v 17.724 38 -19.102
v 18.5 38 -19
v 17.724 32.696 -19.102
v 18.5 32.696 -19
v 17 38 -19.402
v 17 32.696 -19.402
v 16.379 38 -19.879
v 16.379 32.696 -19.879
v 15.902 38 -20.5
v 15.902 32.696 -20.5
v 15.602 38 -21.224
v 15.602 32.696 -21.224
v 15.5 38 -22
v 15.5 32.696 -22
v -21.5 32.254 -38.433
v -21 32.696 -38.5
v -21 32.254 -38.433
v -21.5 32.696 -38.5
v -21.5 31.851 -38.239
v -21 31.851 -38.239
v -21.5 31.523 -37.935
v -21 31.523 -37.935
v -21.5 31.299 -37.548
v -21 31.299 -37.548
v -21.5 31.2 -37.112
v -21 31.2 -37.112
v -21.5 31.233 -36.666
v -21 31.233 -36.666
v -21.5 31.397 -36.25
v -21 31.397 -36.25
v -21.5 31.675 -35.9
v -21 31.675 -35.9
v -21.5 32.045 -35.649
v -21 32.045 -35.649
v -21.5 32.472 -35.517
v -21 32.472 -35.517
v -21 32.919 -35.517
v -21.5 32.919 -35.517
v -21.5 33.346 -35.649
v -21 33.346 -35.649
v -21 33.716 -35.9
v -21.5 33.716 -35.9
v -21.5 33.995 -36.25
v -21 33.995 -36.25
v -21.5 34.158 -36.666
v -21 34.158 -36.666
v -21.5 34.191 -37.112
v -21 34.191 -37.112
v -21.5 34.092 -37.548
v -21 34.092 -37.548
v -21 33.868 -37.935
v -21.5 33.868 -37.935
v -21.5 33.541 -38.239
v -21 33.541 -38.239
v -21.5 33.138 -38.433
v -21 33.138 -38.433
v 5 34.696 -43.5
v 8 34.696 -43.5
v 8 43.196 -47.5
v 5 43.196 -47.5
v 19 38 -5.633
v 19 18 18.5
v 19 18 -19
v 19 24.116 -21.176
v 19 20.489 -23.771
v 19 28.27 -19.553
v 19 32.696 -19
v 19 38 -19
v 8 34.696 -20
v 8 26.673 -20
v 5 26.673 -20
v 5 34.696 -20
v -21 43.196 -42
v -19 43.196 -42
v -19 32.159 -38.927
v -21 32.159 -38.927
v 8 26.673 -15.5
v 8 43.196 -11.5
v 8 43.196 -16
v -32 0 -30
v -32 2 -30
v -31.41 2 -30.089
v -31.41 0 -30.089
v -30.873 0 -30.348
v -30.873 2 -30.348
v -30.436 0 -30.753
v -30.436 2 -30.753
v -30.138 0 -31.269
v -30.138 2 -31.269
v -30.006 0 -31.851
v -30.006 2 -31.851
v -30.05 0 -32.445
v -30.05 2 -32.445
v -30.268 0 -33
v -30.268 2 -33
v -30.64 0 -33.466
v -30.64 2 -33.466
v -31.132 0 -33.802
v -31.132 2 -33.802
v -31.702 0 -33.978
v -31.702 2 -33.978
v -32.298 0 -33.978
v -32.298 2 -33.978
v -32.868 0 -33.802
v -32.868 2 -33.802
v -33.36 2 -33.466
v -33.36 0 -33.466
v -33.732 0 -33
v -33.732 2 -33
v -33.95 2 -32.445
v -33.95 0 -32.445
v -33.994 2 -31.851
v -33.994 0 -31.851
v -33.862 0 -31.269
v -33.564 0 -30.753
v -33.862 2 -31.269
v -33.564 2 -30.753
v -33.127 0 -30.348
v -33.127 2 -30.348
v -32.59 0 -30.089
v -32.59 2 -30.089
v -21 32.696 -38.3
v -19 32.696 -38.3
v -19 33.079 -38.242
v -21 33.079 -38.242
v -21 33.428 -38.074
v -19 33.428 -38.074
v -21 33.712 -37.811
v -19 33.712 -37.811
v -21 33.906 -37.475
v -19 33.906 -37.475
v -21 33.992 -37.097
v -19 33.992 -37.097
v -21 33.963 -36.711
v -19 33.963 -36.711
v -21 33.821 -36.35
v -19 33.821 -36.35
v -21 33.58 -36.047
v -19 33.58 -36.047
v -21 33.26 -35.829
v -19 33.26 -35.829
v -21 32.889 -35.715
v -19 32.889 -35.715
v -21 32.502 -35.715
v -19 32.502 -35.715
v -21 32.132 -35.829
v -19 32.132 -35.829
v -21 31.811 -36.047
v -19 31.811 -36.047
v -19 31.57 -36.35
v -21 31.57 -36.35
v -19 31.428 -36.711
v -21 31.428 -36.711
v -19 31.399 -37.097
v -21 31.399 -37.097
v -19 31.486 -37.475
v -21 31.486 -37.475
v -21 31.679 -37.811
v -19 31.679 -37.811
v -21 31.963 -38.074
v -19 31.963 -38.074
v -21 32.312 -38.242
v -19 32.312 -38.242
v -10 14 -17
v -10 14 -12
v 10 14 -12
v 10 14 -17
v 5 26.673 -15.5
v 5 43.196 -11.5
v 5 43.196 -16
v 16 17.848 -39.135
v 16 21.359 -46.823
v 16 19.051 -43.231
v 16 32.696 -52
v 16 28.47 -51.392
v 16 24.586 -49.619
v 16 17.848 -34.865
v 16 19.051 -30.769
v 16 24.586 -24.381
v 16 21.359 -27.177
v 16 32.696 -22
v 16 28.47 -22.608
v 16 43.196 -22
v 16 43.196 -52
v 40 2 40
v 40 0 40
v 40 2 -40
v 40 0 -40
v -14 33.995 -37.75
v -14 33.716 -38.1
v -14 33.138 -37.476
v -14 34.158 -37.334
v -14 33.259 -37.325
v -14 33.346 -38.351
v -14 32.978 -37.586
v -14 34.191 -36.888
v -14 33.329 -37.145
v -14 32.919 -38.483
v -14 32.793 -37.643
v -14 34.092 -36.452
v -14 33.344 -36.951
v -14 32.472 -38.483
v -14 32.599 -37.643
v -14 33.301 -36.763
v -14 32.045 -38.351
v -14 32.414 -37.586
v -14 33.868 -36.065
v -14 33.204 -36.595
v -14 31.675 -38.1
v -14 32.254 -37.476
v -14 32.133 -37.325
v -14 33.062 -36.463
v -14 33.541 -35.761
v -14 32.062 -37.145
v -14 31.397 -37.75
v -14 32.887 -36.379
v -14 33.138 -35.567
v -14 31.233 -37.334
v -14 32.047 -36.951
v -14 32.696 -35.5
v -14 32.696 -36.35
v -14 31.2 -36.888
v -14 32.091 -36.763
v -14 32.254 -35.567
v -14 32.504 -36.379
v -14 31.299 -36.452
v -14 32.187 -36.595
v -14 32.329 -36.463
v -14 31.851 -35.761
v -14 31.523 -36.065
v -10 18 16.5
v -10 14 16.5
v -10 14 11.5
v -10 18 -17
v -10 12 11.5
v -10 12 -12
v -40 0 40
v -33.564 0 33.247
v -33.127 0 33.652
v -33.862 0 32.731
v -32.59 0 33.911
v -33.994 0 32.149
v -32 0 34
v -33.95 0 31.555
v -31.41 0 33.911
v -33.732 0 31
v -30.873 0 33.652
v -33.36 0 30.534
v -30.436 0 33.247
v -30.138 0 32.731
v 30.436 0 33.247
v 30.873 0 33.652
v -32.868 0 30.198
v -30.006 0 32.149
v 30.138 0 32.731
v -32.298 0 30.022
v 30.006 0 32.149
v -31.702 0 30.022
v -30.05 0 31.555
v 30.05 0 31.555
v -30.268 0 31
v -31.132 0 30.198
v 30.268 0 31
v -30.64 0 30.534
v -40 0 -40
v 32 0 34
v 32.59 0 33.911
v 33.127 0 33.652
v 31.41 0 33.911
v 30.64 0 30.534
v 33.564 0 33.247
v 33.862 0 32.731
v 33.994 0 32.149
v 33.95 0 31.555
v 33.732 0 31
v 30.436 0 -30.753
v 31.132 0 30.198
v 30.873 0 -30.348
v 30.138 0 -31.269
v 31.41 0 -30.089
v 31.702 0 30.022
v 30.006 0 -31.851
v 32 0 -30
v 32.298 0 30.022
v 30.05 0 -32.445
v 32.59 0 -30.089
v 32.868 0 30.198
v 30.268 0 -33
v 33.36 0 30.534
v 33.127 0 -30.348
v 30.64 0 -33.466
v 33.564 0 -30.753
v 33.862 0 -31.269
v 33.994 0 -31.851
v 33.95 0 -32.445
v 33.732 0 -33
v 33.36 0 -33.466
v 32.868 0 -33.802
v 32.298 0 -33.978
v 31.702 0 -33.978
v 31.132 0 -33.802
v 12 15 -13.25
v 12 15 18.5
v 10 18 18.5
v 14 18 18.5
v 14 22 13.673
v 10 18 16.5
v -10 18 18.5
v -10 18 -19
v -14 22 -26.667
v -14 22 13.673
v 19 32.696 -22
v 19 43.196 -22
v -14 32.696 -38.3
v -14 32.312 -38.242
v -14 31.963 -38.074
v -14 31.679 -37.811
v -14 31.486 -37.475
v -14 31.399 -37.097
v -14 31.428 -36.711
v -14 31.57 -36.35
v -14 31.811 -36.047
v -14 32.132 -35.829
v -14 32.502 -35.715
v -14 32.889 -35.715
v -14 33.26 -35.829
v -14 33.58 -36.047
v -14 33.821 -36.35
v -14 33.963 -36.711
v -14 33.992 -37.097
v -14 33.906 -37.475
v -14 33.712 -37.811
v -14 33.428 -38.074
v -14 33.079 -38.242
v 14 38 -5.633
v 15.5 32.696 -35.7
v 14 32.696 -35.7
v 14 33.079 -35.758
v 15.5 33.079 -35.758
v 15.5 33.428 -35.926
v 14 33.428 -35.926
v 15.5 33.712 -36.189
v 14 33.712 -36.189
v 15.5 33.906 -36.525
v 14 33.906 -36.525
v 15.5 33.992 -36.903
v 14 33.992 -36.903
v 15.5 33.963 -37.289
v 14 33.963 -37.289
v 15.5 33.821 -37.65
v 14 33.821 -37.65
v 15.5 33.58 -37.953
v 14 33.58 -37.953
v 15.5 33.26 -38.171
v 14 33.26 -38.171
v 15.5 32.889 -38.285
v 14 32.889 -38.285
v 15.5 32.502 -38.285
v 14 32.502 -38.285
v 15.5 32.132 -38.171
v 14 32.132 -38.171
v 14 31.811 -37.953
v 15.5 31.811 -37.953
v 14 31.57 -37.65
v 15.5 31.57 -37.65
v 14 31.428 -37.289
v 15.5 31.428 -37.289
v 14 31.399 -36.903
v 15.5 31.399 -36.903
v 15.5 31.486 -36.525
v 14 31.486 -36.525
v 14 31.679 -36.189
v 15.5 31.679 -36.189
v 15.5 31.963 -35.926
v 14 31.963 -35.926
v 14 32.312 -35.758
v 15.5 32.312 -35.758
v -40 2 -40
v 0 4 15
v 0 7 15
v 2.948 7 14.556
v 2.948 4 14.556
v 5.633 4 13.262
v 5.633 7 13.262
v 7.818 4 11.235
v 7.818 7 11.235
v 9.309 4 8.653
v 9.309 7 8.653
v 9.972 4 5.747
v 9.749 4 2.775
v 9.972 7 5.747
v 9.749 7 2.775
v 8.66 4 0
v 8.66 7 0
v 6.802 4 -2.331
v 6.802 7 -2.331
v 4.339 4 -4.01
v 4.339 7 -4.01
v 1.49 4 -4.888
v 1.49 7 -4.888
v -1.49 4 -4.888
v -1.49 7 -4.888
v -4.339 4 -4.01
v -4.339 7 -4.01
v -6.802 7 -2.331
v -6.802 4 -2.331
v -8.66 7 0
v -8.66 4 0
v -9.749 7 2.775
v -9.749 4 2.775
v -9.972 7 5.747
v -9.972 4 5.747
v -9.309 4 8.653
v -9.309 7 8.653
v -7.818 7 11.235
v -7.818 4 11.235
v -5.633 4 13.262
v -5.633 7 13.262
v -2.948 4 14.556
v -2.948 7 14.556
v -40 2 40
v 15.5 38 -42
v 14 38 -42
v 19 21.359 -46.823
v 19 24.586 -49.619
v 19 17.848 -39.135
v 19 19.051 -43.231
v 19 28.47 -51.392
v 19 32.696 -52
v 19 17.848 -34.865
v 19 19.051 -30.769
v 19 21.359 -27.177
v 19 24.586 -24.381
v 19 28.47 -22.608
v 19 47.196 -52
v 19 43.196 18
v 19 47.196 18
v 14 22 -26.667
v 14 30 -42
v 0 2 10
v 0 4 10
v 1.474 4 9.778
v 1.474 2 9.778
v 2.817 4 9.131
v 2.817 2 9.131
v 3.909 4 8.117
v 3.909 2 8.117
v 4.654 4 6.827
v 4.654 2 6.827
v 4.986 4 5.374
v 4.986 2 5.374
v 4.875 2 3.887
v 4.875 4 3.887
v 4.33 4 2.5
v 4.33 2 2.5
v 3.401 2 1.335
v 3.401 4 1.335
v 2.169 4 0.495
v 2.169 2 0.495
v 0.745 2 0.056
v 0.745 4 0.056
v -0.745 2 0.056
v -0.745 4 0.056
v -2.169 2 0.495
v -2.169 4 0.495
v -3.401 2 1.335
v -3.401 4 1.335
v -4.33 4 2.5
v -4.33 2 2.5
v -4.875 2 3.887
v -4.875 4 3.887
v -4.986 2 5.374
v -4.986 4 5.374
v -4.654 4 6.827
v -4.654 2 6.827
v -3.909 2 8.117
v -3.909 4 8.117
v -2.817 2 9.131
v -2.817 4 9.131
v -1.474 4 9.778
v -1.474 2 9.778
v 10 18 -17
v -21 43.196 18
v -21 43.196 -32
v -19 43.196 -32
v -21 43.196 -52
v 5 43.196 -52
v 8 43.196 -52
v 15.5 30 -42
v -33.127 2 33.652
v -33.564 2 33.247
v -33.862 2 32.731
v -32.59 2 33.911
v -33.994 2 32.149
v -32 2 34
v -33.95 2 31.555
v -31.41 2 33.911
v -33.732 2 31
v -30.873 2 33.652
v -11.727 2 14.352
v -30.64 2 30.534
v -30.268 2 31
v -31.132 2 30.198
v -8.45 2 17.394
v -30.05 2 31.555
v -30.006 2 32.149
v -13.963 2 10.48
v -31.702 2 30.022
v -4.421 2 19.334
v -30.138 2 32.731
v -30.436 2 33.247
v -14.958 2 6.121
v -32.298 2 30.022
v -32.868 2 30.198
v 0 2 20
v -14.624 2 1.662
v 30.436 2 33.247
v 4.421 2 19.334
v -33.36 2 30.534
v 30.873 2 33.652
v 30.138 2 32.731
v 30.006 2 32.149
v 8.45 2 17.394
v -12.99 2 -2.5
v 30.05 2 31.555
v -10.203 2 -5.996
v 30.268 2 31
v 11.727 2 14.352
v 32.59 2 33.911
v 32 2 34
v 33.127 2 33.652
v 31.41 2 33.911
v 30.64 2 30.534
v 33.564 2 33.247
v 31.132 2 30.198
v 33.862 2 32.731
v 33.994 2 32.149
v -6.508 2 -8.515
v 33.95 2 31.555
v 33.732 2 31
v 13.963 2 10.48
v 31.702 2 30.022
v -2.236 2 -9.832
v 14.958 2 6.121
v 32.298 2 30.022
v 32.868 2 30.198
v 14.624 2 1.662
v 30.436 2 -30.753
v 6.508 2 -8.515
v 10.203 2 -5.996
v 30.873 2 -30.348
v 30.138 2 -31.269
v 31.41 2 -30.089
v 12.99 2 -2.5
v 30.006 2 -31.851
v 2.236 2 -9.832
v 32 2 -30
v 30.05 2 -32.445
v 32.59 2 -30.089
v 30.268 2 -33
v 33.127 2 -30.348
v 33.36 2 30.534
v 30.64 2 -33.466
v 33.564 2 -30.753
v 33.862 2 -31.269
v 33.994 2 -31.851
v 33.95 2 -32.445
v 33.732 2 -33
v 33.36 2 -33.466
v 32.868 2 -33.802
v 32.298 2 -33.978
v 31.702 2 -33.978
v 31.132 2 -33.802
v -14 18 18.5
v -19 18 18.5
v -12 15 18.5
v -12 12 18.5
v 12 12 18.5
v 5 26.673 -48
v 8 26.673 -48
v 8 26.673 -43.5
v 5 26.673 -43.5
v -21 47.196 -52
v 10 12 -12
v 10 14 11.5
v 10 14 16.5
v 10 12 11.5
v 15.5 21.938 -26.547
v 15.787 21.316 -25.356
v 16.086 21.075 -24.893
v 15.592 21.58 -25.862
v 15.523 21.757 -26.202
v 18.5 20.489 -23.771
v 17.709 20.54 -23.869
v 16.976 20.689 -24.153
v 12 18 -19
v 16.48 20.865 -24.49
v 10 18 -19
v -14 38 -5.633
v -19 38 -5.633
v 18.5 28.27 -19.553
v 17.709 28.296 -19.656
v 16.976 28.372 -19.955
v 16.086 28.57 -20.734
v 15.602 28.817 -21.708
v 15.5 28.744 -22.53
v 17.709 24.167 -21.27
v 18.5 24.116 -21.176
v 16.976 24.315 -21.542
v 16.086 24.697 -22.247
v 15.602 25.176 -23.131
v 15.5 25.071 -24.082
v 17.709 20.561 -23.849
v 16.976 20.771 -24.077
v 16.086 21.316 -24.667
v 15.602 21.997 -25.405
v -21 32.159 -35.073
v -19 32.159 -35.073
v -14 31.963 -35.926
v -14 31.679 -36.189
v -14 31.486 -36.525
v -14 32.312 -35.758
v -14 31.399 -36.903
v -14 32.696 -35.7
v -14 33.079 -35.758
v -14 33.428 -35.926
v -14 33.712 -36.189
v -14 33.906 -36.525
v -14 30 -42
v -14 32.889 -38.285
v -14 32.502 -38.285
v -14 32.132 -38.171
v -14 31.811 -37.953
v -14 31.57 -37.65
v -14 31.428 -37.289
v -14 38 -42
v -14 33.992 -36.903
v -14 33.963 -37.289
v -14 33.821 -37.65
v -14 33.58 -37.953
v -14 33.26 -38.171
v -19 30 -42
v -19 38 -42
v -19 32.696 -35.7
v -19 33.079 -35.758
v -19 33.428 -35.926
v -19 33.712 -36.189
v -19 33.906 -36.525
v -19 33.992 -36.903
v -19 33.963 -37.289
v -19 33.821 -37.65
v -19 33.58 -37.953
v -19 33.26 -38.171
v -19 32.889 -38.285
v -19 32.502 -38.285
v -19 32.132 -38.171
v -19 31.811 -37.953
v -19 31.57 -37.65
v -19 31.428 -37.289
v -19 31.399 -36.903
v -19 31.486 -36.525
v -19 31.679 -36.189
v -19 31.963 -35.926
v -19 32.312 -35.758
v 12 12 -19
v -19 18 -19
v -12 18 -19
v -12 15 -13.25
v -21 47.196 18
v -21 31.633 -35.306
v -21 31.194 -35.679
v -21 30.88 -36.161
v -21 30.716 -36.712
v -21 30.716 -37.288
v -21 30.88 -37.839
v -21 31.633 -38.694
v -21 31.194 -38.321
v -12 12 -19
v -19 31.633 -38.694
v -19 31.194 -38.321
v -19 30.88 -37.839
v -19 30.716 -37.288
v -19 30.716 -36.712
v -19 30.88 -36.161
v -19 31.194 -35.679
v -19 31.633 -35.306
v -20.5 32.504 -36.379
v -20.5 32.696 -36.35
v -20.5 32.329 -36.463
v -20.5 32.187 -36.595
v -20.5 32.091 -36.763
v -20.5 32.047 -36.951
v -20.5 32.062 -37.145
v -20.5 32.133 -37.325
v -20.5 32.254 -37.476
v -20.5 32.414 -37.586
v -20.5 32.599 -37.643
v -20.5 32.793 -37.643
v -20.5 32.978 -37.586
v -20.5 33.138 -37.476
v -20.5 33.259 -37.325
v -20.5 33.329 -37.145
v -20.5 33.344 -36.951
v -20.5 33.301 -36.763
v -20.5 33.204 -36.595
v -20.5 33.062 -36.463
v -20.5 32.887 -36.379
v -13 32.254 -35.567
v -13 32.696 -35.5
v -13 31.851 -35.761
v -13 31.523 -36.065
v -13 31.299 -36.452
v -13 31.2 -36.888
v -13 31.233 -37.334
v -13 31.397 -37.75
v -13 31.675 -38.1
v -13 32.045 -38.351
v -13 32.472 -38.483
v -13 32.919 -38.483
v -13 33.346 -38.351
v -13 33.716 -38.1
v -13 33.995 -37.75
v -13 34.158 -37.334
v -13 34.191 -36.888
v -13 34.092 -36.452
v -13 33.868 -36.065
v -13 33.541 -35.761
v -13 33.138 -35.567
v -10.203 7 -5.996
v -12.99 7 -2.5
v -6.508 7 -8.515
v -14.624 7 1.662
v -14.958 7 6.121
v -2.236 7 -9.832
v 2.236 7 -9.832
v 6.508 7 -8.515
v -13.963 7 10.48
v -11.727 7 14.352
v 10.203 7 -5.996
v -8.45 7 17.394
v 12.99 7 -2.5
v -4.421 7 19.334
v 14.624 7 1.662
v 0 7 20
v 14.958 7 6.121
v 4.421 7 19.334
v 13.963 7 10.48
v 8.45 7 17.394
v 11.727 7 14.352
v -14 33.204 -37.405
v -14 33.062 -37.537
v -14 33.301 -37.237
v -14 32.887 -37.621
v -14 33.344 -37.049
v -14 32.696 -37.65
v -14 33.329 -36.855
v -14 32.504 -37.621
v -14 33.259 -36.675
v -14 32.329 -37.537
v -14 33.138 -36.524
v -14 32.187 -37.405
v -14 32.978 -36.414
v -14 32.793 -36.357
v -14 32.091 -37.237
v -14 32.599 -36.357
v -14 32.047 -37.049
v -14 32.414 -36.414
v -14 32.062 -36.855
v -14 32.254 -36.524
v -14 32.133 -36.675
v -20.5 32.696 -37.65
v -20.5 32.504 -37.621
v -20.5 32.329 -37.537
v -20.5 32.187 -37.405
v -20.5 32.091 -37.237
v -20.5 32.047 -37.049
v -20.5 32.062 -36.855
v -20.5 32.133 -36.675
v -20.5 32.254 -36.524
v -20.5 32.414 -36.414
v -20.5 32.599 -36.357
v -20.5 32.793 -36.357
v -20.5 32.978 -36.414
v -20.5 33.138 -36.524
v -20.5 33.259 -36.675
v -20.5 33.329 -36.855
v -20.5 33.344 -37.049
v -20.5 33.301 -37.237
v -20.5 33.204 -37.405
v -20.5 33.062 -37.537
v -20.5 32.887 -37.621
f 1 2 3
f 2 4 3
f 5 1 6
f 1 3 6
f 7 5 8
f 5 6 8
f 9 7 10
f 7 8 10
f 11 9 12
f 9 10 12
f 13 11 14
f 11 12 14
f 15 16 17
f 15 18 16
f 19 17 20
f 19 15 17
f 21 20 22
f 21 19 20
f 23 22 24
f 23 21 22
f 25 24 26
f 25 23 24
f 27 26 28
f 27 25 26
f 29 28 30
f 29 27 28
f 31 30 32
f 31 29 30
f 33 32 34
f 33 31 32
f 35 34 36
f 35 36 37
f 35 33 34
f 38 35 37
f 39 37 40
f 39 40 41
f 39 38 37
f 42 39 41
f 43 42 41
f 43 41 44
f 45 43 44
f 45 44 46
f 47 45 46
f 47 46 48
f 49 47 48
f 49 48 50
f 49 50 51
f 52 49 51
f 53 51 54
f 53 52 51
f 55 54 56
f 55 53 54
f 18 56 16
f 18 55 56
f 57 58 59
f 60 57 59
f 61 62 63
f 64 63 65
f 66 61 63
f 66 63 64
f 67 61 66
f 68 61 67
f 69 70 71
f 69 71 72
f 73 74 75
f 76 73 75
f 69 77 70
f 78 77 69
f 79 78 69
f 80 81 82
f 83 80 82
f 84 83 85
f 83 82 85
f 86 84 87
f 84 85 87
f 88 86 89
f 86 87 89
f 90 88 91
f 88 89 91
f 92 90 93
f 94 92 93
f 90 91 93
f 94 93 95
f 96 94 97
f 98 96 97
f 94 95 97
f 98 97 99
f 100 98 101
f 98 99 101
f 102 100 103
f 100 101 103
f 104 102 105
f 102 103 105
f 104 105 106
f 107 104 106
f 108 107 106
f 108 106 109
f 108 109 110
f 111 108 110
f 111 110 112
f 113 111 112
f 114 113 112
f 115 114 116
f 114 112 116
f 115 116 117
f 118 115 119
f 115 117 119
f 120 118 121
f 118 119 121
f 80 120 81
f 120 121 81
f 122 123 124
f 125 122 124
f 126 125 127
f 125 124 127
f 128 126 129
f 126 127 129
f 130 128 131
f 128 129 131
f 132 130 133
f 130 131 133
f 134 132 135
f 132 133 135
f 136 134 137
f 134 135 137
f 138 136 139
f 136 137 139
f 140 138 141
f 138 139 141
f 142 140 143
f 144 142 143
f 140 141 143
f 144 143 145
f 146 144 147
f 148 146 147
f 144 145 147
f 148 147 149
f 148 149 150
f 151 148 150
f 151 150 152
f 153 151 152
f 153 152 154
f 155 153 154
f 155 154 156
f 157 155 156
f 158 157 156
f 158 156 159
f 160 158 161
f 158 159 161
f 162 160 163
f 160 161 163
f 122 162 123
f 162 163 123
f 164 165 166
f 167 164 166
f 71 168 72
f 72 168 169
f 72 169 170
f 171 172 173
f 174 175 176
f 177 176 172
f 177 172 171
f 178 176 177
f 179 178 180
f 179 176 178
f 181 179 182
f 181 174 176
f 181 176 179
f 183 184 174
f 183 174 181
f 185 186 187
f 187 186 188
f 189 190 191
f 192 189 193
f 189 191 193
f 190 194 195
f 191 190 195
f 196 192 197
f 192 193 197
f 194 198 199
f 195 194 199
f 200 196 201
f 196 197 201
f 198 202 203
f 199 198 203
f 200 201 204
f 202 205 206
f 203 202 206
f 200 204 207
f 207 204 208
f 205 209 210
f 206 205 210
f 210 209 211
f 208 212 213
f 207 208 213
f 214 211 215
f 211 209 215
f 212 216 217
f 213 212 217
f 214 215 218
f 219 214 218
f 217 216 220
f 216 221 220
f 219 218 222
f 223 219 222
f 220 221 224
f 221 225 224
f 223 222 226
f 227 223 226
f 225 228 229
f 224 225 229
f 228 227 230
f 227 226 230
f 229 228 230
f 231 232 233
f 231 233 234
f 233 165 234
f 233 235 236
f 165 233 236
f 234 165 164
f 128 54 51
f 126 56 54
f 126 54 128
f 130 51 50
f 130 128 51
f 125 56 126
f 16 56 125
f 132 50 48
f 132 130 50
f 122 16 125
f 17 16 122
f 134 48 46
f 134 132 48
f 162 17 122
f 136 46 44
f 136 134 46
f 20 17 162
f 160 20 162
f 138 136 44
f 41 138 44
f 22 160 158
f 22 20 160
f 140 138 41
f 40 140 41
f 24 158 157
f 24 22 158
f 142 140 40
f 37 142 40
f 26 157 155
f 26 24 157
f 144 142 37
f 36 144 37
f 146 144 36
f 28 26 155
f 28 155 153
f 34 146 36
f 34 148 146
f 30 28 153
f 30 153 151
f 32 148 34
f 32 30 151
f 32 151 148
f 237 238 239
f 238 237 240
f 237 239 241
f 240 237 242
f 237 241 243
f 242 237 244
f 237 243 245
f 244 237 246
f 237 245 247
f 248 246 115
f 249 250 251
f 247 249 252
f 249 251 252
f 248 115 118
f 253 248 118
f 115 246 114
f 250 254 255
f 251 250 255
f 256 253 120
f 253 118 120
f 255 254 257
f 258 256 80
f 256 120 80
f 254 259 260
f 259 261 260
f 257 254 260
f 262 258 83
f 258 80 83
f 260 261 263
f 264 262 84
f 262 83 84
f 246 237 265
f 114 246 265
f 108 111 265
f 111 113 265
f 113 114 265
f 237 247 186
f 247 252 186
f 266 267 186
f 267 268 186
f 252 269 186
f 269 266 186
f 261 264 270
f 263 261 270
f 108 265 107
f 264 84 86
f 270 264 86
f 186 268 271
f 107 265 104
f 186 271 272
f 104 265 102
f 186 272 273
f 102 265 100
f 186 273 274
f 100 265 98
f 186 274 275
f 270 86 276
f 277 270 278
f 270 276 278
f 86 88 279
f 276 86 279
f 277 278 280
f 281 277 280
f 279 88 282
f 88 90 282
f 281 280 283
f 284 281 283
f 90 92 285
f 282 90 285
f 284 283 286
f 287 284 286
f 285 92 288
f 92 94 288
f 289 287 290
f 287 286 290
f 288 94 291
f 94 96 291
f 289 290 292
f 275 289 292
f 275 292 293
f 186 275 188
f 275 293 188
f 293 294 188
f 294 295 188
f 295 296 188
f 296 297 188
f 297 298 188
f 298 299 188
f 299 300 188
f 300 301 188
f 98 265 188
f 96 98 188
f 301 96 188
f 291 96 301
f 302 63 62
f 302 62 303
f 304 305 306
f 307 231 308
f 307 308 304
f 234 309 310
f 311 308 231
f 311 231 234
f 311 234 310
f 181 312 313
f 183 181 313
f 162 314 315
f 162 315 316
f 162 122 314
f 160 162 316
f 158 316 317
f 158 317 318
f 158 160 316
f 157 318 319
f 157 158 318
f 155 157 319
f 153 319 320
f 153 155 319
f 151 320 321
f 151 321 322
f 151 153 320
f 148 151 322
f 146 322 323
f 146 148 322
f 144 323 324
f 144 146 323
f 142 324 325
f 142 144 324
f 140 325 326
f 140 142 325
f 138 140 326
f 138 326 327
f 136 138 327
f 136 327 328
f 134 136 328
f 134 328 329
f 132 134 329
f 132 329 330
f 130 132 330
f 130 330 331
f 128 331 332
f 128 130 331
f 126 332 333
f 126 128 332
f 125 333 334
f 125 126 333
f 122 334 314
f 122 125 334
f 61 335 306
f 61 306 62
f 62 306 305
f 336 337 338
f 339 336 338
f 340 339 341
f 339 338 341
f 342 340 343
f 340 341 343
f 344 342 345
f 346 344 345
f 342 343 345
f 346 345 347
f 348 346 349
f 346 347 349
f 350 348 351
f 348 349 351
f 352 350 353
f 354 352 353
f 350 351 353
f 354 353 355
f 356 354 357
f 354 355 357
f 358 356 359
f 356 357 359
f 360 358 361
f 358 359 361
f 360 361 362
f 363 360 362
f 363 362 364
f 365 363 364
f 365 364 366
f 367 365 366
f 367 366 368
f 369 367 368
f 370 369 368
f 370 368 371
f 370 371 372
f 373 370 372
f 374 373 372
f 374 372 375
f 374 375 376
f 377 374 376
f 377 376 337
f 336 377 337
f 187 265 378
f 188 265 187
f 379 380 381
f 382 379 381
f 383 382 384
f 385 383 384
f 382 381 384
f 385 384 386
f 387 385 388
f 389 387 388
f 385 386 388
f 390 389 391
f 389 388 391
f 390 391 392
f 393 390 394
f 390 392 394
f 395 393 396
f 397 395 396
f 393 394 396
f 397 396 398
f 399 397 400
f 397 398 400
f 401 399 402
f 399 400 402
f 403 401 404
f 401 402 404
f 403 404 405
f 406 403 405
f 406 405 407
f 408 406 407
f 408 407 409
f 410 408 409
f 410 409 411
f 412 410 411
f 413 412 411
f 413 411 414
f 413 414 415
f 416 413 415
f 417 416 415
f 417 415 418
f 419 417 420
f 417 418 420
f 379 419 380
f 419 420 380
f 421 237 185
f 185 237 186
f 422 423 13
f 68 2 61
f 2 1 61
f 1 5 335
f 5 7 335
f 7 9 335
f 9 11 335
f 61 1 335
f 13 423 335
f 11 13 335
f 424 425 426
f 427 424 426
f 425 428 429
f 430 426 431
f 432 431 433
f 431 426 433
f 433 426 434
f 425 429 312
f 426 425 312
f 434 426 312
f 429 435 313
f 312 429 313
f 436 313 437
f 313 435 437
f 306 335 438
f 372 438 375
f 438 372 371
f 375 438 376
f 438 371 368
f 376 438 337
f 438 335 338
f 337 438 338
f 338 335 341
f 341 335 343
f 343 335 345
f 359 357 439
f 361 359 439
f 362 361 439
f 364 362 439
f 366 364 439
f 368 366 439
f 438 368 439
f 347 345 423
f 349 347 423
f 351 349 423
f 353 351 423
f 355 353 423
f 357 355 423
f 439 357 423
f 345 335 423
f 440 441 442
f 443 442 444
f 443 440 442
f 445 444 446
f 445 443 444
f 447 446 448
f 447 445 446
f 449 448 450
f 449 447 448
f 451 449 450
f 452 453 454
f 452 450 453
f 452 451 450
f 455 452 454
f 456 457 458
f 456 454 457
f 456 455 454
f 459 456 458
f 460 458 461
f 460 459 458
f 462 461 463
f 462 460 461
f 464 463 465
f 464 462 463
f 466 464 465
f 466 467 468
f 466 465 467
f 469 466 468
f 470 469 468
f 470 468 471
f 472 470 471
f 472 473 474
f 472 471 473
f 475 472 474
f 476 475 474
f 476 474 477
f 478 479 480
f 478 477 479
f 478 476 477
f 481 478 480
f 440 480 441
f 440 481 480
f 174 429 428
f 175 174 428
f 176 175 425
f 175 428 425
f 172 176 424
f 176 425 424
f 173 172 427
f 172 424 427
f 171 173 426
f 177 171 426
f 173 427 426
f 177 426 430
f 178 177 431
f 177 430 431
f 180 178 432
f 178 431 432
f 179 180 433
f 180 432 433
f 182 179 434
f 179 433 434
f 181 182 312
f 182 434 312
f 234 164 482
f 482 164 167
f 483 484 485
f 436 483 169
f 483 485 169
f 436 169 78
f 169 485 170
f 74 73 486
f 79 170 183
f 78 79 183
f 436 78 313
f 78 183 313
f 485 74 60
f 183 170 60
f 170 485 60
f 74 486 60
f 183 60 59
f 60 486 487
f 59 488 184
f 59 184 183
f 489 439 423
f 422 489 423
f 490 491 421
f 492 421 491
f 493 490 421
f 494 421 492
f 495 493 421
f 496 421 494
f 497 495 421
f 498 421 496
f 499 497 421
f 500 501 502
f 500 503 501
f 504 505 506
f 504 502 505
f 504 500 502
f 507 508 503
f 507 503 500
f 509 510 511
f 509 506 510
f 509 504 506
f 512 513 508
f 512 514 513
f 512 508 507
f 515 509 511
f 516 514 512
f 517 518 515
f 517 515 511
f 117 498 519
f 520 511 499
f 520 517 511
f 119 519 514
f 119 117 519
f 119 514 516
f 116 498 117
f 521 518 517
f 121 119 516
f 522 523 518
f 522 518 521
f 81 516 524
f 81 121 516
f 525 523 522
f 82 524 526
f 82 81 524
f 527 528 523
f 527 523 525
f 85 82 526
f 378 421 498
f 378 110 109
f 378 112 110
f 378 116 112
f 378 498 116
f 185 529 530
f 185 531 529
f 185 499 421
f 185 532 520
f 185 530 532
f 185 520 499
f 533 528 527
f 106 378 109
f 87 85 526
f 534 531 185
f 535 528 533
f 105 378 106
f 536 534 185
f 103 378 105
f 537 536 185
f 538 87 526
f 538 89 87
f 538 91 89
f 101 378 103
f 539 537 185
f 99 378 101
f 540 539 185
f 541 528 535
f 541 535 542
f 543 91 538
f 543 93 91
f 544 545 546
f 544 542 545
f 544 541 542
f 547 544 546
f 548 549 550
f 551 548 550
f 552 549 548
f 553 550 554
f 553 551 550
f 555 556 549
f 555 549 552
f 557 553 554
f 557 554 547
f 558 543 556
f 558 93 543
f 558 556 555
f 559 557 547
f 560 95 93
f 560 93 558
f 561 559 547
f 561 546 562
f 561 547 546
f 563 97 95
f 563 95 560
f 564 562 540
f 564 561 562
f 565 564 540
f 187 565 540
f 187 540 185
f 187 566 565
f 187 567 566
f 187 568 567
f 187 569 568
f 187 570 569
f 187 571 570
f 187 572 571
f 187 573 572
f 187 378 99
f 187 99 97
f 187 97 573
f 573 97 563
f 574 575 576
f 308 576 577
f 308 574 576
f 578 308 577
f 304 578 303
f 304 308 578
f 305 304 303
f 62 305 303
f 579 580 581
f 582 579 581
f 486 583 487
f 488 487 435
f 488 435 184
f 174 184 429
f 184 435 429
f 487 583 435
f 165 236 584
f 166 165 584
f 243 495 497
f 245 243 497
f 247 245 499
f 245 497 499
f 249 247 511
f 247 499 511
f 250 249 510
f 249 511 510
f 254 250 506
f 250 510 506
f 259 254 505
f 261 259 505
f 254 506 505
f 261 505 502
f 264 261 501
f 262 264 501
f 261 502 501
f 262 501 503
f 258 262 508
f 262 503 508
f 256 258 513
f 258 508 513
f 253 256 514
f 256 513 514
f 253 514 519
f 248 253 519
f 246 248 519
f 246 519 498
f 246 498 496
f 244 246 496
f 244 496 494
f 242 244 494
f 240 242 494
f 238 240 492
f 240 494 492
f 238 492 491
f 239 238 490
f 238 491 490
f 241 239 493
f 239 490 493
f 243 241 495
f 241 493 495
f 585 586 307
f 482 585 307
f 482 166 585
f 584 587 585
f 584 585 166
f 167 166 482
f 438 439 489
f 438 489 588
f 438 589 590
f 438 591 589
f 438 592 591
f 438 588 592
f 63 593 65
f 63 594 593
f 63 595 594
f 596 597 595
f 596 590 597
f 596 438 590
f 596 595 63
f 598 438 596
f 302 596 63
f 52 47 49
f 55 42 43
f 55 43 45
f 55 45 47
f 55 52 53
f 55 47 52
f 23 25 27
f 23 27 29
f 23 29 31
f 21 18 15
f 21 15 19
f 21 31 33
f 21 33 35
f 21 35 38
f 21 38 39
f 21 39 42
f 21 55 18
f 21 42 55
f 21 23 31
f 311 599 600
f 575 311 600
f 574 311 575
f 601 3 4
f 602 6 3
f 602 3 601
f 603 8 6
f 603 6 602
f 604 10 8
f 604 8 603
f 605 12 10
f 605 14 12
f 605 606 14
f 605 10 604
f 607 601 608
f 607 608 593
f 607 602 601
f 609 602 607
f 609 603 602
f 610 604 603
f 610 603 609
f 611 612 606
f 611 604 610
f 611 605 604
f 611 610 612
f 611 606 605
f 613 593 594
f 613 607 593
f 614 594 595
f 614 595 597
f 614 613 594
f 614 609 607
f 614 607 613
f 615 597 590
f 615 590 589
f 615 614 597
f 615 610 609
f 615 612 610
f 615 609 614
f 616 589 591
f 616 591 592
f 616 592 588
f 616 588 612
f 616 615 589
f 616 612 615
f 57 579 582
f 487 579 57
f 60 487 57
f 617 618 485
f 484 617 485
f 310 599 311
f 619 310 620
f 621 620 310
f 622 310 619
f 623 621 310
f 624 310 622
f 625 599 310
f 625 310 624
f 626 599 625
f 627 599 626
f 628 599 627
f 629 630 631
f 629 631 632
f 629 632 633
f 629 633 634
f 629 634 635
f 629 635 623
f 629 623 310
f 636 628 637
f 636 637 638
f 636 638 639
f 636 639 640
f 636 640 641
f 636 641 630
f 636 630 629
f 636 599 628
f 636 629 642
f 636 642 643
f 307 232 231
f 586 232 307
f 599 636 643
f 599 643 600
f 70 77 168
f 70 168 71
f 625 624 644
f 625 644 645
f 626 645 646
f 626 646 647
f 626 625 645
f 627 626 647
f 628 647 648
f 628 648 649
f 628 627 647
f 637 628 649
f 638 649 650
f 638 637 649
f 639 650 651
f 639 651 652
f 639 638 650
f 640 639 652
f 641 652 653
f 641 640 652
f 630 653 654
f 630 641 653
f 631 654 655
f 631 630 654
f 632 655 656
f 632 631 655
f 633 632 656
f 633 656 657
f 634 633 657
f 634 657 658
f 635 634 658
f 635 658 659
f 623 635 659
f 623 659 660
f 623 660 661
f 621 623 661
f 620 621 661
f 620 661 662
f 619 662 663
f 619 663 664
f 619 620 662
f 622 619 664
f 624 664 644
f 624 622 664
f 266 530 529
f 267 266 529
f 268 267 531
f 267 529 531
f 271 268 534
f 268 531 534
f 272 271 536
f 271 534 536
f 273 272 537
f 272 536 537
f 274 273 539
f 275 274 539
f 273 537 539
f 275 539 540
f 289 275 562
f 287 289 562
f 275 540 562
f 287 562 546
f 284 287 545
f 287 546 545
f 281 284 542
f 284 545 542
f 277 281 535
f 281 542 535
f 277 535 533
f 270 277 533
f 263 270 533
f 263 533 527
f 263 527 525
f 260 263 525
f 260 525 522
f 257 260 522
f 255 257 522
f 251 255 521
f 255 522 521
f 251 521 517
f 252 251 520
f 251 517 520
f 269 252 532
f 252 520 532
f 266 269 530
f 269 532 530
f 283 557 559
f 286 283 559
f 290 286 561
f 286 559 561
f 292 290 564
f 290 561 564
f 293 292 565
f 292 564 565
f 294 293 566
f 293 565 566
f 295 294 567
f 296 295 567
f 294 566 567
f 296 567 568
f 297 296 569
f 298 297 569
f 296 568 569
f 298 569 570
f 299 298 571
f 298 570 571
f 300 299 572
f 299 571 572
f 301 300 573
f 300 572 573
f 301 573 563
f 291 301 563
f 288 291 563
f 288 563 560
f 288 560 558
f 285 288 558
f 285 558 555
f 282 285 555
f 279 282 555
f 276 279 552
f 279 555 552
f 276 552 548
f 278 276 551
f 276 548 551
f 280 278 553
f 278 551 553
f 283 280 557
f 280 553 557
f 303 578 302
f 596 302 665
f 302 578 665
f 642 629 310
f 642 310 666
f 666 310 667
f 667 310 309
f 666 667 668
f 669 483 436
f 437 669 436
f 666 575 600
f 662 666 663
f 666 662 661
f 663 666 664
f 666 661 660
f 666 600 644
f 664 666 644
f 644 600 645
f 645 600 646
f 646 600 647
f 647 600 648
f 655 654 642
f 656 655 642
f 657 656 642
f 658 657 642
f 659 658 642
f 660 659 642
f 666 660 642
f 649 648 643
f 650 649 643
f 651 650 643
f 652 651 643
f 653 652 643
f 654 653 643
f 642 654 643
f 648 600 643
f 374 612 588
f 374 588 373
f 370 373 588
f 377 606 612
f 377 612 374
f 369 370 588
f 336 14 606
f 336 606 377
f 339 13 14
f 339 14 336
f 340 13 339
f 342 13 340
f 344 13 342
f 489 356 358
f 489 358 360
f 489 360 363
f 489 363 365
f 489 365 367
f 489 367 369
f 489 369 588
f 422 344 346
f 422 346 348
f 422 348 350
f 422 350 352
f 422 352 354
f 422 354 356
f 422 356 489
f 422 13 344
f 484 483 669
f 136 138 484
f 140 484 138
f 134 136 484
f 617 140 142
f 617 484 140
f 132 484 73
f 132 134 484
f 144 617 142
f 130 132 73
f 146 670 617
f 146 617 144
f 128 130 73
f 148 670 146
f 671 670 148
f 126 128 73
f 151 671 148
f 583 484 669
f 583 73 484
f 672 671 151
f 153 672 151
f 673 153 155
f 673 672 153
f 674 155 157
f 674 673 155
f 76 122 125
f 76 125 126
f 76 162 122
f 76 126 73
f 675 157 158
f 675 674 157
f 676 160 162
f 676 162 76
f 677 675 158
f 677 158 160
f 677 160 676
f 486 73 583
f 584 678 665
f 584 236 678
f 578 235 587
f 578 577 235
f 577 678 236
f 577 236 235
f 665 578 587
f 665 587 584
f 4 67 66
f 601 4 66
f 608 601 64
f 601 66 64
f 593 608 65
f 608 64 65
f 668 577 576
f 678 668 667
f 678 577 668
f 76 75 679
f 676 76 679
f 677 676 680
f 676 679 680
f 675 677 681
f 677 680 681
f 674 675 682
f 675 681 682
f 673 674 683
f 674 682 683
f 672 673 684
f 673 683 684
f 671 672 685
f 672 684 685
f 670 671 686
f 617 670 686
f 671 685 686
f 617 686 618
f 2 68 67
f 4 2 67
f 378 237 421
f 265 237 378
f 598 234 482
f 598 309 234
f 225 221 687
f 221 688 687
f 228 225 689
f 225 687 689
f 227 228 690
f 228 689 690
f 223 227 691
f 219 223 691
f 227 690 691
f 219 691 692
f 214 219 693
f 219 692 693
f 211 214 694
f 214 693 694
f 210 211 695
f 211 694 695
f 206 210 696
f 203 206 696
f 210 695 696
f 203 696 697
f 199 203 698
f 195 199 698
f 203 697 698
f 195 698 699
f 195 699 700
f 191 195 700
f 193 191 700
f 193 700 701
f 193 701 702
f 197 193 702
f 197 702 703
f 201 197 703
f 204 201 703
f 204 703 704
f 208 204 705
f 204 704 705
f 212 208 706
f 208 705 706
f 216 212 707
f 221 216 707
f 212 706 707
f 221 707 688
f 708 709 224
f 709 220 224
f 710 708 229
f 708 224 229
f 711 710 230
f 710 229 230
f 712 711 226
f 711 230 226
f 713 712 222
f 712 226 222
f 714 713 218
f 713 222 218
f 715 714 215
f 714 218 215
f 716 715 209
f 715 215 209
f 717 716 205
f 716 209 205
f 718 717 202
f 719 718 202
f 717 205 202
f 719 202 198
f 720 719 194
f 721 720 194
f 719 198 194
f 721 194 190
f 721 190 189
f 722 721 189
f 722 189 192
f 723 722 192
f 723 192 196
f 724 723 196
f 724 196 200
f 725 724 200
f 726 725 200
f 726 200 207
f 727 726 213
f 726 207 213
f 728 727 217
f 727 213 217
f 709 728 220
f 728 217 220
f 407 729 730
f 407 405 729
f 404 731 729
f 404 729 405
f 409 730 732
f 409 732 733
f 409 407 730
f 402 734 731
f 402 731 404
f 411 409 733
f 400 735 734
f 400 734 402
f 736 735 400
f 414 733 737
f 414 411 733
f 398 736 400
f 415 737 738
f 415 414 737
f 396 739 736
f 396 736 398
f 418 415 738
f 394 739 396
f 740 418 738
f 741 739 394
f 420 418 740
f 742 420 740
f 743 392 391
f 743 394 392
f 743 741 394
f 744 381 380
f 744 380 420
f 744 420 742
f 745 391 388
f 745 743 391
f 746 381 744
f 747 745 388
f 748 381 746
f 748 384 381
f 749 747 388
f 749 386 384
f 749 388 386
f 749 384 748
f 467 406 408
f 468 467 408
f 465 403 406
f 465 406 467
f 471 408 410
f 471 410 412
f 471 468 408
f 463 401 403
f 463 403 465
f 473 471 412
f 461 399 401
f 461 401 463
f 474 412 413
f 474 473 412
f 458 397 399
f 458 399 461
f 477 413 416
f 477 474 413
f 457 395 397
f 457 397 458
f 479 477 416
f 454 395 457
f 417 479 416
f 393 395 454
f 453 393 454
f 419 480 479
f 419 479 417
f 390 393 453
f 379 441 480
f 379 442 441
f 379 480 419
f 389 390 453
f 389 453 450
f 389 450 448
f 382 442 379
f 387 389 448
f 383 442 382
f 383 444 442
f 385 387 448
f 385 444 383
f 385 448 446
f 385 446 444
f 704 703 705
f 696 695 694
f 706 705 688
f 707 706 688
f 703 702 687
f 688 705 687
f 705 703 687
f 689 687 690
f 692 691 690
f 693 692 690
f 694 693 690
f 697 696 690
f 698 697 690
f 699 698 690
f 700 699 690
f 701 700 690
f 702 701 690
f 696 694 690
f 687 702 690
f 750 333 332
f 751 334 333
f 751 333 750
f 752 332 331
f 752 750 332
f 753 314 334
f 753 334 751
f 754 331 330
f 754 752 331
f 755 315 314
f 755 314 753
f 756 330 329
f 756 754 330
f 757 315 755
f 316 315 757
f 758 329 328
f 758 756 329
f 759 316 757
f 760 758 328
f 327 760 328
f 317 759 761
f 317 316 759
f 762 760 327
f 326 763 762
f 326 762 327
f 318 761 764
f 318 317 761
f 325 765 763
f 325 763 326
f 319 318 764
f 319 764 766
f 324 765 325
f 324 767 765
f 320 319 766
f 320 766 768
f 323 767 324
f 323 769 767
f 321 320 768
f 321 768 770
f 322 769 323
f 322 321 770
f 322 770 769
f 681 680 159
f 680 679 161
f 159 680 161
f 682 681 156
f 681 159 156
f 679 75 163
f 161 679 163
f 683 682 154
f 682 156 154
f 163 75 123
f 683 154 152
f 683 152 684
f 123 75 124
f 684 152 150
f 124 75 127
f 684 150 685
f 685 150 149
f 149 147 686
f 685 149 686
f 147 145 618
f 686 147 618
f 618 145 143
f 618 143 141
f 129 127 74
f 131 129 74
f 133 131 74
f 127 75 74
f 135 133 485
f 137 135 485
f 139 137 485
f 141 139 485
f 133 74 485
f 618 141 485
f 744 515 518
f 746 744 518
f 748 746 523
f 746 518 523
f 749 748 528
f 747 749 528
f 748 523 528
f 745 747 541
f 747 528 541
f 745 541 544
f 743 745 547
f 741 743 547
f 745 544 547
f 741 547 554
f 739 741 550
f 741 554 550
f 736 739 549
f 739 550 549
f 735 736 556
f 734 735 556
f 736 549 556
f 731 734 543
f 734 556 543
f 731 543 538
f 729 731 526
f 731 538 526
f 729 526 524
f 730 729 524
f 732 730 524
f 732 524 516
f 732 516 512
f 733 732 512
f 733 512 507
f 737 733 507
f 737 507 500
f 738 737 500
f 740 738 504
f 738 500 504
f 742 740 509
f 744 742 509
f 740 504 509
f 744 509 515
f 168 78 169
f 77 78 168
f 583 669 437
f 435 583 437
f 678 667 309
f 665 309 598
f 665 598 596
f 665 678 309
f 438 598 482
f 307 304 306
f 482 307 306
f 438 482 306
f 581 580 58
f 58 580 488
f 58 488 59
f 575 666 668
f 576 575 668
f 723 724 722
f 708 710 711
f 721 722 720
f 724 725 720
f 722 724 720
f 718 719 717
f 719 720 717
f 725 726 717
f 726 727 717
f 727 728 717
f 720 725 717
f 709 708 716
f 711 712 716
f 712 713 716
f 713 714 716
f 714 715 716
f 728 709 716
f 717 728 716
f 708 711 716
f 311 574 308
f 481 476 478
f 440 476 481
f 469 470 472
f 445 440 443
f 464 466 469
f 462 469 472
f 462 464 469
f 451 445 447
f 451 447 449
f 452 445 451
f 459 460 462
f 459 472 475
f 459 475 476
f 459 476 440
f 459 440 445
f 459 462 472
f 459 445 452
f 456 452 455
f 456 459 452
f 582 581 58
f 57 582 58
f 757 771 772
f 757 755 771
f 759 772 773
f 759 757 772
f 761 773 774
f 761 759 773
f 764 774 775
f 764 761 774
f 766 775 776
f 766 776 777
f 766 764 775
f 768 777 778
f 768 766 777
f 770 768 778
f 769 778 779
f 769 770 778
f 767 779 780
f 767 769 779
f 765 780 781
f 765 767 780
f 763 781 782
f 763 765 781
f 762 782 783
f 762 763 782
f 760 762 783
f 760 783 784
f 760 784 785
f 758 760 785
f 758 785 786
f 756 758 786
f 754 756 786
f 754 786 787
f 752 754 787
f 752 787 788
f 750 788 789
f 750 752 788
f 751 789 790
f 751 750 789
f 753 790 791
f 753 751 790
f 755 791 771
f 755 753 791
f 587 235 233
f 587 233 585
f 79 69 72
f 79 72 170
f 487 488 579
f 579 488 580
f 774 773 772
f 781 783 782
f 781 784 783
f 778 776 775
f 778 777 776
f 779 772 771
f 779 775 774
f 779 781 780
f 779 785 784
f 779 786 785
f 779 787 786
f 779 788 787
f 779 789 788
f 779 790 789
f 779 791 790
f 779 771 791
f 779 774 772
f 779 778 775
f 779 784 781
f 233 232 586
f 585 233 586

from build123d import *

# Parameters (mm, degrees)
SKETCH1_W            = 80
SKETCH1_H            = 80
BOSS_EXTRUDE1_DEPTH  = 2
SKETCH2_R            = 15
SKETCH2_R_2          = 5
BOSS_EXTRUDE2_DEPTH  = 5
SKETCH13_R           = 10
CUT_EXTRUDE1_DEPTH   = 3
BOSS_EXTRUDE3_START  = 10
SKETCH4_W            = 24
SKETCH4_H            = 37.5
SKETCH4_W_2          = 20
SKETCH4_H_2          = 33.5
BOSS_EXTRUDE3_DEPTH  = 6
BOSS_EXTRUDE4_START  = 2
SKETCH5_R            = 1.3
BOSS_EXTRUDE4_DEPTH  = 5
BOSS_EXTRUDE5_REACH  = 83.879
SKETCH10_W           = 20
SKETCH10_H           = 5
BOSS_EXTRUDE8_DEPTH  = 2
CUT_EXTRUDE3_DEPTH   = 10
SKETCH9_R            = 1.3
BOSS_EXTRUDE7_DEPTH  = 2
SKETCH14_R           = 2
CUT_EXTRUDE2_DEPTH   = 2
BOSS_EXTRUDE11_START = 33
SKETCH9_3_R          = 1.3
BOSS_EXTRUDE11_DEPTH = 2
BOSS_EXTRUDE6_START  = 5.195652
SKETCH7_W            = 40
SKETCH7_H            = 70
BOSS_EXTRUDE6_DEPTH  = 4
BOSS_EXTRUDE12_START = 22
BOSS_EXTRUDE12_DEPTH = 3
BOSS_EXTRUDE13_DEPTH = 3
CUT_EXTRUDE4_DEPTH   = 3.5
FILLET1_R            = 3


with BuildPart() as part:
    # Sketch1 → Boss-Extrude1 (new body)
    with BuildSketch(Plane(origin=(0, 0, 0), x_dir=(1, 0, 0), z_dir=(0, 1, 0))):
        Rectangle(SKETCH1_W, SKETCH1_H)
    extrude(amount=BOSS_EXTRUDE1_DEPTH)

    # Sketch2 → Boss-Extrude2 (add)
    with BuildSketch(Plane(origin=(0, 2, 0), x_dir=(1, 0, 0), z_dir=(0, 1, 0))):
        with Locations(Location((0, -5, 0), (0, 0, 270))):
            Circle(SKETCH2_R)
        with Locations(Location((0, -5, 0), (0, 0, 270))):
            Circle(SKETCH2_R_2, mode=Mode.SUBTRACT)
    extrude(amount=BOSS_EXTRUDE2_DEPTH)

    # Sketch13 → Cut-Extrude1 (cut)
    with BuildSketch(Plane(origin=(0, 7, 0), x_dir=(1, 0, 0), z_dir=(0, 1, 0))):
        with Locations(Location((0, -5, 0), (0, 0, 270))):
            Circle(SKETCH13_R)
    extrude(amount=-CUT_EXTRUDE1_DEPTH, mode=Mode.SUBTRACT)

    # Sketch14 → Cut-Extrude2 (cut)
    with BuildSketch(Plane(origin=(0, 2, 0), x_dir=(1, 0, 0), z_dir=(0, 1, 0))):
        with Locations(Location((-32, 32, 0), (0, 0, 270))):
            Circle(SKETCH14_R)
        with Locations(Location((32, 32, 0), (0, 0, 270))):
            Circle(SKETCH14_R)
        with Locations(Location((32, -32, 0), (0, 0, 270))):
            Circle(SKETCH14_R)
        with Locations(Location((-32, -32, 0), (0, 0, 270))):
            Circle(SKETCH14_R)
    extrude(amount=-CUT_EXTRUDE2_DEPTH, mode=Mode.SUBTRACT)


with BuildPart() as body_2:
    # Sketch4 → Boss-Extrude3 (new body)
    with BuildSketch(Plane(origin=(0, 2, 0), x_dir=(1, 0, 0), z_dir=(0, 1, 0)).offset(BOSS_EXTRUDE3_START)):
        with Locations((0, 0.25)):
            Rectangle(SKETCH4_W, SKETCH4_H)
        with Locations((0, 0.25)):
            Rectangle(SKETCH4_W_2, SKETCH4_H_2, mode=Mode.SUBTRACT)
    extrude(amount=BOSS_EXTRUDE3_DEPTH)



with BuildPart() as body_3:
    # Sketch5 → Boss-Extrude4 (new body)
    with BuildSketch(Plane.ZY.offset(12).offset(BOSS_EXTRUDE4_START)):
        Polygon((-42, 38), (-5.633281563, 38), (18.5, 18), (-19, 18), (-42, 30), align=None)
        with Locations((-37, 32.695652174)):
            Circle(SKETCH5_R, mode=Mode.SUBTRACT)
    extrude(amount=BOSS_EXTRUDE4_DEPTH)


with BuildPart() as body_2_1:
    add(body_2.part)

    add(body_3.part)  # Boss-Extrude5 merges body 3
    # Boss-Extrude5: up to this plane
    boss_extrude5_end = Plane(origin=(-19, 18, -19), z_dir=(0, 0.8865848461654549, 0.4625660066950196))
    # Sketch6 → Boss-Extrude5 (add, up to the surface)
    with BuildSketch(Plane.XY.offset(18.5), mode=Mode.PRIVATE) as boss_extrude5_sk1:
        Polygon((-19, 18), (-12, 15), (-12, 18), (-10, 18), (-14, 22), (-14, 18), align=None)
    boss_extrude5_tool1 = split(extrude(boss_extrude5_sk1.sketch, amount=-BOSS_EXTRUDE5_REACH, mode=Mode.PRIVATE), bisect_by=boss_extrude5_end, keep=Keep.BOTH, mode=Mode.PRIVATE)
    add(boss_extrude5_tool1.solids().sort_by_distance((-13.612613, 18.009009, 18.5))[0])

    # Sketch10 → Boss-Extrude8 (add)
    with BuildSketch(Plane.XZ.offset(-12)):
        with Locations((0, 14)):
            Rectangle(SKETCH10_W, SKETCH10_H)
        with Locations((0, -14.5)):
            Rectangle(SKETCH10_W, SKETCH10_H)
    extrude(amount=-BOSS_EXTRUDE8_DEPTH)

    # Sketch20 → Cut-Extrude3 (cut)
    with BuildSketch(Plane.ZY.offset(14)):
        Polygon((18.5, 18), (13.673343687, 22), (18.5, 22), align=None)
    extrude(amount=-CUT_EXTRUDE3_DEPTH, mode=Mode.SUBTRACT)

    # Mirror2: body 2 across plane


with BuildPart() as body_2_2:
    add(body_2_1.part)
    add(body_2_1.part.mirror(Plane(origin=(0, 0, 0), x_dir=(0, 0, 1), z_dir=(1, 0, 0))))

    # Sketch26 → Cut-Extrude4 (cut)
    with BuildSketch(Plane(origin=(19, 0, 0), x_dir=(0, 0, -1), z_dir=(1, 0, 0))):
        with BuildLine():
            Line((-21, 40.195652174), (19, 40.195652174))
            Line((19, 40.195652174), (19, 32.695652174))
            ThreePointArc((19, 32.695652174), (37, 14.695652174), (55, 32.695652174))
            Line((55, 32.695652174), (55, 50.195652174))
            Line((55, 50.195652174), (-21, 50.195652174))
            Line((-21, 50.195652174), (-21, 40.195652174))
        make_face()
    extrude(amount=-CUT_EXTRUDE4_DEPTH, mode=Mode.SUBTRACT)

    # Fillet1
    fillet1_edges = [body_2_2.edges().sort_by_distance(p)[0] for p in [
        (15.5, 26.14280534, -20.235149915),
        (15.5, 35.347826087, -19),
    ]]
    fillet(fillet1_edges, radius=FILLET1_R)


with BuildPart() as body_3_2:
    # Sketch9 → Boss-Extrude7 (new body)
    with BuildSketch(Plane(origin=(-19, 0, 0), x_dir=(0, 0, -1), z_dir=(1, 0, 0))):
        with BuildLine():
            Line((42, 43.195652174), (38.926692968, 32.159131713))
            ThreePointArc((38.926692968, 32.159131713), (37, 30.695652174), (35.073307032, 32.159131713))
            Line((35.073307032, 32.159131713), (32, 43.195652174))
            Line((32, 43.195652174), (42, 43.195652174))
        make_face()
        with Locations((37, 32.695652174)):
            Circle(SKETCH9_R, mode=Mode.SUBTRACT)
    extrude(amount=-BOSS_EXTRUDE7_DEPTH)

    # Sketch7 → Boss-Extrude6 (add)
    with BuildSketch(Plane(origin=(0, 38, 0), x_dir=(1, 0, 0), z_dir=(0, 1, 0)).offset(BOSS_EXTRUDE6_START)):
        with Locations((-1, 17)):
            Rectangle(SKETCH7_W, SKETCH7_H)
    extrude(amount=BOSS_EXTRUDE6_DEPTH)

    # Sketch12 → Boss-Extrude12 (add)
    with BuildSketch(Plane(origin=(-14, 0, 0), x_dir=(0, 0, -1), z_dir=(1, 0, 0)).offset(BOSS_EXTRUDE12_START)):
        Polygon((15.5, 26.672940532), (20, 26.672940532), (20, 34.695652174), (16, 43.195652174), (11.5, 43.195652174), align=None)
        Polygon((48, 26.672940532), (43.5, 26.672940532), (43.5, 34.695652174), (47.5, 43.195652174), (52, 43.195652174), align=None)
    extrude(amount=-BOSS_EXTRUDE12_DEPTH)

    # Sketch25 → Boss-Extrude13 (add)
    with BuildSketch(Plane(origin=(19, 0, 0), x_dir=(0, 0, -1), z_dir=(1, 0, 0))):
        with BuildLine():
            Line((22, 32.695652174), (22, 43.195652174))
            Line((22, 43.195652174), (52, 43.195652174))
            Line((52, 43.195652174), (52, 32.695652174))
            ThreePointArc((52, 32.695652174), (37, 17.695652174), (22, 32.695652174))
        make_face()
    extrude(amount=-BOSS_EXTRUDE13_DEPTH)


with BuildPart() as body_4:
    # Sketch9<3> → Boss-Extrude11 (new body)
    with BuildSketch(Plane(origin=(-19, 0, 0), x_dir=(0, 0, -1), z_dir=(1, 0, 0)).offset(BOSS_EXTRUDE11_START)):
        with BuildLine():
            Line((42, 43.195652174), (38.926692968, 32.159131713))
            ThreePointArc((38.926692968, 32.159131713), (37, 30.695652174), (35.073307032, 32.159131713))
            Line((35.073307032, 32.159131713), (32, 43.195652174))
            Line((32, 43.195652174), (42, 43.195652174))
        make_face()
        with Locations((37, 32.695652174)):
            Circle(SKETCH9_3_R, mode=Mode.SUBTRACT)
    extrude(amount=BOSS_EXTRUDE11_DEPTH)


with BuildPart() as body_5:
    # Sketch19 → Revolve1 (revolve)
    with BuildSketch(Plane(origin=(0, 39.904576281, -11.112108685), x_dir=(1, 0, 0), z_dir=(0, 0.9633464842335737, -0.268260230587415)), mode=Mode.PRIVATE) as revolve1_sk:
        Polygon((-21, 25.572876725), (-21, 25.372876725), (-21.5, 25.372876725), (-21.5, 26.872876725), (-21, 26.872876725), (-20.5, 26.872876725), (-20.5, 26.222876725), (-14, 26.222876725), (-14, 25.572876725), align=None)
    revolve(revolve1_sk.sketch.rotate(Axis((-14, 32.695652174, -37), (-1, 0, 0)), 164.439233372), axis=Axis((-14, 32.695652174, -37), (-1, 0, 0)))


with BuildPart() as body_6:
    # Sketch23 → Revolve2 (revolve)
    with BuildSketch(Plane(origin=(0, 39.904576281, -11.112108685), x_dir=(1, 0, 0), z_dir=(0, 0.9633464842335737, -0.268260230587415)), mode=Mode.PRIVATE) as revolve2_sk:
        Polygon((-20.5, 26.872876725), (-14, 26.872876725), (-13, 26.872876725), (-13, 28.372876725), (-14, 28.372876725), (-14, 27.522876725), (-20.5, 27.522876725), align=None)
    revolve(revolve2_sk.sketch.rotate(Axis((-20.5, 32.695652174, -37), (1, 0, 0)), 195.560766628), axis=Axis((-20.5, 32.695652174, -37), (1, 0, 0)))


solid = Compound([part.part, body_2_2.part, body_3_2.part, body_5.part, body_6.part])
